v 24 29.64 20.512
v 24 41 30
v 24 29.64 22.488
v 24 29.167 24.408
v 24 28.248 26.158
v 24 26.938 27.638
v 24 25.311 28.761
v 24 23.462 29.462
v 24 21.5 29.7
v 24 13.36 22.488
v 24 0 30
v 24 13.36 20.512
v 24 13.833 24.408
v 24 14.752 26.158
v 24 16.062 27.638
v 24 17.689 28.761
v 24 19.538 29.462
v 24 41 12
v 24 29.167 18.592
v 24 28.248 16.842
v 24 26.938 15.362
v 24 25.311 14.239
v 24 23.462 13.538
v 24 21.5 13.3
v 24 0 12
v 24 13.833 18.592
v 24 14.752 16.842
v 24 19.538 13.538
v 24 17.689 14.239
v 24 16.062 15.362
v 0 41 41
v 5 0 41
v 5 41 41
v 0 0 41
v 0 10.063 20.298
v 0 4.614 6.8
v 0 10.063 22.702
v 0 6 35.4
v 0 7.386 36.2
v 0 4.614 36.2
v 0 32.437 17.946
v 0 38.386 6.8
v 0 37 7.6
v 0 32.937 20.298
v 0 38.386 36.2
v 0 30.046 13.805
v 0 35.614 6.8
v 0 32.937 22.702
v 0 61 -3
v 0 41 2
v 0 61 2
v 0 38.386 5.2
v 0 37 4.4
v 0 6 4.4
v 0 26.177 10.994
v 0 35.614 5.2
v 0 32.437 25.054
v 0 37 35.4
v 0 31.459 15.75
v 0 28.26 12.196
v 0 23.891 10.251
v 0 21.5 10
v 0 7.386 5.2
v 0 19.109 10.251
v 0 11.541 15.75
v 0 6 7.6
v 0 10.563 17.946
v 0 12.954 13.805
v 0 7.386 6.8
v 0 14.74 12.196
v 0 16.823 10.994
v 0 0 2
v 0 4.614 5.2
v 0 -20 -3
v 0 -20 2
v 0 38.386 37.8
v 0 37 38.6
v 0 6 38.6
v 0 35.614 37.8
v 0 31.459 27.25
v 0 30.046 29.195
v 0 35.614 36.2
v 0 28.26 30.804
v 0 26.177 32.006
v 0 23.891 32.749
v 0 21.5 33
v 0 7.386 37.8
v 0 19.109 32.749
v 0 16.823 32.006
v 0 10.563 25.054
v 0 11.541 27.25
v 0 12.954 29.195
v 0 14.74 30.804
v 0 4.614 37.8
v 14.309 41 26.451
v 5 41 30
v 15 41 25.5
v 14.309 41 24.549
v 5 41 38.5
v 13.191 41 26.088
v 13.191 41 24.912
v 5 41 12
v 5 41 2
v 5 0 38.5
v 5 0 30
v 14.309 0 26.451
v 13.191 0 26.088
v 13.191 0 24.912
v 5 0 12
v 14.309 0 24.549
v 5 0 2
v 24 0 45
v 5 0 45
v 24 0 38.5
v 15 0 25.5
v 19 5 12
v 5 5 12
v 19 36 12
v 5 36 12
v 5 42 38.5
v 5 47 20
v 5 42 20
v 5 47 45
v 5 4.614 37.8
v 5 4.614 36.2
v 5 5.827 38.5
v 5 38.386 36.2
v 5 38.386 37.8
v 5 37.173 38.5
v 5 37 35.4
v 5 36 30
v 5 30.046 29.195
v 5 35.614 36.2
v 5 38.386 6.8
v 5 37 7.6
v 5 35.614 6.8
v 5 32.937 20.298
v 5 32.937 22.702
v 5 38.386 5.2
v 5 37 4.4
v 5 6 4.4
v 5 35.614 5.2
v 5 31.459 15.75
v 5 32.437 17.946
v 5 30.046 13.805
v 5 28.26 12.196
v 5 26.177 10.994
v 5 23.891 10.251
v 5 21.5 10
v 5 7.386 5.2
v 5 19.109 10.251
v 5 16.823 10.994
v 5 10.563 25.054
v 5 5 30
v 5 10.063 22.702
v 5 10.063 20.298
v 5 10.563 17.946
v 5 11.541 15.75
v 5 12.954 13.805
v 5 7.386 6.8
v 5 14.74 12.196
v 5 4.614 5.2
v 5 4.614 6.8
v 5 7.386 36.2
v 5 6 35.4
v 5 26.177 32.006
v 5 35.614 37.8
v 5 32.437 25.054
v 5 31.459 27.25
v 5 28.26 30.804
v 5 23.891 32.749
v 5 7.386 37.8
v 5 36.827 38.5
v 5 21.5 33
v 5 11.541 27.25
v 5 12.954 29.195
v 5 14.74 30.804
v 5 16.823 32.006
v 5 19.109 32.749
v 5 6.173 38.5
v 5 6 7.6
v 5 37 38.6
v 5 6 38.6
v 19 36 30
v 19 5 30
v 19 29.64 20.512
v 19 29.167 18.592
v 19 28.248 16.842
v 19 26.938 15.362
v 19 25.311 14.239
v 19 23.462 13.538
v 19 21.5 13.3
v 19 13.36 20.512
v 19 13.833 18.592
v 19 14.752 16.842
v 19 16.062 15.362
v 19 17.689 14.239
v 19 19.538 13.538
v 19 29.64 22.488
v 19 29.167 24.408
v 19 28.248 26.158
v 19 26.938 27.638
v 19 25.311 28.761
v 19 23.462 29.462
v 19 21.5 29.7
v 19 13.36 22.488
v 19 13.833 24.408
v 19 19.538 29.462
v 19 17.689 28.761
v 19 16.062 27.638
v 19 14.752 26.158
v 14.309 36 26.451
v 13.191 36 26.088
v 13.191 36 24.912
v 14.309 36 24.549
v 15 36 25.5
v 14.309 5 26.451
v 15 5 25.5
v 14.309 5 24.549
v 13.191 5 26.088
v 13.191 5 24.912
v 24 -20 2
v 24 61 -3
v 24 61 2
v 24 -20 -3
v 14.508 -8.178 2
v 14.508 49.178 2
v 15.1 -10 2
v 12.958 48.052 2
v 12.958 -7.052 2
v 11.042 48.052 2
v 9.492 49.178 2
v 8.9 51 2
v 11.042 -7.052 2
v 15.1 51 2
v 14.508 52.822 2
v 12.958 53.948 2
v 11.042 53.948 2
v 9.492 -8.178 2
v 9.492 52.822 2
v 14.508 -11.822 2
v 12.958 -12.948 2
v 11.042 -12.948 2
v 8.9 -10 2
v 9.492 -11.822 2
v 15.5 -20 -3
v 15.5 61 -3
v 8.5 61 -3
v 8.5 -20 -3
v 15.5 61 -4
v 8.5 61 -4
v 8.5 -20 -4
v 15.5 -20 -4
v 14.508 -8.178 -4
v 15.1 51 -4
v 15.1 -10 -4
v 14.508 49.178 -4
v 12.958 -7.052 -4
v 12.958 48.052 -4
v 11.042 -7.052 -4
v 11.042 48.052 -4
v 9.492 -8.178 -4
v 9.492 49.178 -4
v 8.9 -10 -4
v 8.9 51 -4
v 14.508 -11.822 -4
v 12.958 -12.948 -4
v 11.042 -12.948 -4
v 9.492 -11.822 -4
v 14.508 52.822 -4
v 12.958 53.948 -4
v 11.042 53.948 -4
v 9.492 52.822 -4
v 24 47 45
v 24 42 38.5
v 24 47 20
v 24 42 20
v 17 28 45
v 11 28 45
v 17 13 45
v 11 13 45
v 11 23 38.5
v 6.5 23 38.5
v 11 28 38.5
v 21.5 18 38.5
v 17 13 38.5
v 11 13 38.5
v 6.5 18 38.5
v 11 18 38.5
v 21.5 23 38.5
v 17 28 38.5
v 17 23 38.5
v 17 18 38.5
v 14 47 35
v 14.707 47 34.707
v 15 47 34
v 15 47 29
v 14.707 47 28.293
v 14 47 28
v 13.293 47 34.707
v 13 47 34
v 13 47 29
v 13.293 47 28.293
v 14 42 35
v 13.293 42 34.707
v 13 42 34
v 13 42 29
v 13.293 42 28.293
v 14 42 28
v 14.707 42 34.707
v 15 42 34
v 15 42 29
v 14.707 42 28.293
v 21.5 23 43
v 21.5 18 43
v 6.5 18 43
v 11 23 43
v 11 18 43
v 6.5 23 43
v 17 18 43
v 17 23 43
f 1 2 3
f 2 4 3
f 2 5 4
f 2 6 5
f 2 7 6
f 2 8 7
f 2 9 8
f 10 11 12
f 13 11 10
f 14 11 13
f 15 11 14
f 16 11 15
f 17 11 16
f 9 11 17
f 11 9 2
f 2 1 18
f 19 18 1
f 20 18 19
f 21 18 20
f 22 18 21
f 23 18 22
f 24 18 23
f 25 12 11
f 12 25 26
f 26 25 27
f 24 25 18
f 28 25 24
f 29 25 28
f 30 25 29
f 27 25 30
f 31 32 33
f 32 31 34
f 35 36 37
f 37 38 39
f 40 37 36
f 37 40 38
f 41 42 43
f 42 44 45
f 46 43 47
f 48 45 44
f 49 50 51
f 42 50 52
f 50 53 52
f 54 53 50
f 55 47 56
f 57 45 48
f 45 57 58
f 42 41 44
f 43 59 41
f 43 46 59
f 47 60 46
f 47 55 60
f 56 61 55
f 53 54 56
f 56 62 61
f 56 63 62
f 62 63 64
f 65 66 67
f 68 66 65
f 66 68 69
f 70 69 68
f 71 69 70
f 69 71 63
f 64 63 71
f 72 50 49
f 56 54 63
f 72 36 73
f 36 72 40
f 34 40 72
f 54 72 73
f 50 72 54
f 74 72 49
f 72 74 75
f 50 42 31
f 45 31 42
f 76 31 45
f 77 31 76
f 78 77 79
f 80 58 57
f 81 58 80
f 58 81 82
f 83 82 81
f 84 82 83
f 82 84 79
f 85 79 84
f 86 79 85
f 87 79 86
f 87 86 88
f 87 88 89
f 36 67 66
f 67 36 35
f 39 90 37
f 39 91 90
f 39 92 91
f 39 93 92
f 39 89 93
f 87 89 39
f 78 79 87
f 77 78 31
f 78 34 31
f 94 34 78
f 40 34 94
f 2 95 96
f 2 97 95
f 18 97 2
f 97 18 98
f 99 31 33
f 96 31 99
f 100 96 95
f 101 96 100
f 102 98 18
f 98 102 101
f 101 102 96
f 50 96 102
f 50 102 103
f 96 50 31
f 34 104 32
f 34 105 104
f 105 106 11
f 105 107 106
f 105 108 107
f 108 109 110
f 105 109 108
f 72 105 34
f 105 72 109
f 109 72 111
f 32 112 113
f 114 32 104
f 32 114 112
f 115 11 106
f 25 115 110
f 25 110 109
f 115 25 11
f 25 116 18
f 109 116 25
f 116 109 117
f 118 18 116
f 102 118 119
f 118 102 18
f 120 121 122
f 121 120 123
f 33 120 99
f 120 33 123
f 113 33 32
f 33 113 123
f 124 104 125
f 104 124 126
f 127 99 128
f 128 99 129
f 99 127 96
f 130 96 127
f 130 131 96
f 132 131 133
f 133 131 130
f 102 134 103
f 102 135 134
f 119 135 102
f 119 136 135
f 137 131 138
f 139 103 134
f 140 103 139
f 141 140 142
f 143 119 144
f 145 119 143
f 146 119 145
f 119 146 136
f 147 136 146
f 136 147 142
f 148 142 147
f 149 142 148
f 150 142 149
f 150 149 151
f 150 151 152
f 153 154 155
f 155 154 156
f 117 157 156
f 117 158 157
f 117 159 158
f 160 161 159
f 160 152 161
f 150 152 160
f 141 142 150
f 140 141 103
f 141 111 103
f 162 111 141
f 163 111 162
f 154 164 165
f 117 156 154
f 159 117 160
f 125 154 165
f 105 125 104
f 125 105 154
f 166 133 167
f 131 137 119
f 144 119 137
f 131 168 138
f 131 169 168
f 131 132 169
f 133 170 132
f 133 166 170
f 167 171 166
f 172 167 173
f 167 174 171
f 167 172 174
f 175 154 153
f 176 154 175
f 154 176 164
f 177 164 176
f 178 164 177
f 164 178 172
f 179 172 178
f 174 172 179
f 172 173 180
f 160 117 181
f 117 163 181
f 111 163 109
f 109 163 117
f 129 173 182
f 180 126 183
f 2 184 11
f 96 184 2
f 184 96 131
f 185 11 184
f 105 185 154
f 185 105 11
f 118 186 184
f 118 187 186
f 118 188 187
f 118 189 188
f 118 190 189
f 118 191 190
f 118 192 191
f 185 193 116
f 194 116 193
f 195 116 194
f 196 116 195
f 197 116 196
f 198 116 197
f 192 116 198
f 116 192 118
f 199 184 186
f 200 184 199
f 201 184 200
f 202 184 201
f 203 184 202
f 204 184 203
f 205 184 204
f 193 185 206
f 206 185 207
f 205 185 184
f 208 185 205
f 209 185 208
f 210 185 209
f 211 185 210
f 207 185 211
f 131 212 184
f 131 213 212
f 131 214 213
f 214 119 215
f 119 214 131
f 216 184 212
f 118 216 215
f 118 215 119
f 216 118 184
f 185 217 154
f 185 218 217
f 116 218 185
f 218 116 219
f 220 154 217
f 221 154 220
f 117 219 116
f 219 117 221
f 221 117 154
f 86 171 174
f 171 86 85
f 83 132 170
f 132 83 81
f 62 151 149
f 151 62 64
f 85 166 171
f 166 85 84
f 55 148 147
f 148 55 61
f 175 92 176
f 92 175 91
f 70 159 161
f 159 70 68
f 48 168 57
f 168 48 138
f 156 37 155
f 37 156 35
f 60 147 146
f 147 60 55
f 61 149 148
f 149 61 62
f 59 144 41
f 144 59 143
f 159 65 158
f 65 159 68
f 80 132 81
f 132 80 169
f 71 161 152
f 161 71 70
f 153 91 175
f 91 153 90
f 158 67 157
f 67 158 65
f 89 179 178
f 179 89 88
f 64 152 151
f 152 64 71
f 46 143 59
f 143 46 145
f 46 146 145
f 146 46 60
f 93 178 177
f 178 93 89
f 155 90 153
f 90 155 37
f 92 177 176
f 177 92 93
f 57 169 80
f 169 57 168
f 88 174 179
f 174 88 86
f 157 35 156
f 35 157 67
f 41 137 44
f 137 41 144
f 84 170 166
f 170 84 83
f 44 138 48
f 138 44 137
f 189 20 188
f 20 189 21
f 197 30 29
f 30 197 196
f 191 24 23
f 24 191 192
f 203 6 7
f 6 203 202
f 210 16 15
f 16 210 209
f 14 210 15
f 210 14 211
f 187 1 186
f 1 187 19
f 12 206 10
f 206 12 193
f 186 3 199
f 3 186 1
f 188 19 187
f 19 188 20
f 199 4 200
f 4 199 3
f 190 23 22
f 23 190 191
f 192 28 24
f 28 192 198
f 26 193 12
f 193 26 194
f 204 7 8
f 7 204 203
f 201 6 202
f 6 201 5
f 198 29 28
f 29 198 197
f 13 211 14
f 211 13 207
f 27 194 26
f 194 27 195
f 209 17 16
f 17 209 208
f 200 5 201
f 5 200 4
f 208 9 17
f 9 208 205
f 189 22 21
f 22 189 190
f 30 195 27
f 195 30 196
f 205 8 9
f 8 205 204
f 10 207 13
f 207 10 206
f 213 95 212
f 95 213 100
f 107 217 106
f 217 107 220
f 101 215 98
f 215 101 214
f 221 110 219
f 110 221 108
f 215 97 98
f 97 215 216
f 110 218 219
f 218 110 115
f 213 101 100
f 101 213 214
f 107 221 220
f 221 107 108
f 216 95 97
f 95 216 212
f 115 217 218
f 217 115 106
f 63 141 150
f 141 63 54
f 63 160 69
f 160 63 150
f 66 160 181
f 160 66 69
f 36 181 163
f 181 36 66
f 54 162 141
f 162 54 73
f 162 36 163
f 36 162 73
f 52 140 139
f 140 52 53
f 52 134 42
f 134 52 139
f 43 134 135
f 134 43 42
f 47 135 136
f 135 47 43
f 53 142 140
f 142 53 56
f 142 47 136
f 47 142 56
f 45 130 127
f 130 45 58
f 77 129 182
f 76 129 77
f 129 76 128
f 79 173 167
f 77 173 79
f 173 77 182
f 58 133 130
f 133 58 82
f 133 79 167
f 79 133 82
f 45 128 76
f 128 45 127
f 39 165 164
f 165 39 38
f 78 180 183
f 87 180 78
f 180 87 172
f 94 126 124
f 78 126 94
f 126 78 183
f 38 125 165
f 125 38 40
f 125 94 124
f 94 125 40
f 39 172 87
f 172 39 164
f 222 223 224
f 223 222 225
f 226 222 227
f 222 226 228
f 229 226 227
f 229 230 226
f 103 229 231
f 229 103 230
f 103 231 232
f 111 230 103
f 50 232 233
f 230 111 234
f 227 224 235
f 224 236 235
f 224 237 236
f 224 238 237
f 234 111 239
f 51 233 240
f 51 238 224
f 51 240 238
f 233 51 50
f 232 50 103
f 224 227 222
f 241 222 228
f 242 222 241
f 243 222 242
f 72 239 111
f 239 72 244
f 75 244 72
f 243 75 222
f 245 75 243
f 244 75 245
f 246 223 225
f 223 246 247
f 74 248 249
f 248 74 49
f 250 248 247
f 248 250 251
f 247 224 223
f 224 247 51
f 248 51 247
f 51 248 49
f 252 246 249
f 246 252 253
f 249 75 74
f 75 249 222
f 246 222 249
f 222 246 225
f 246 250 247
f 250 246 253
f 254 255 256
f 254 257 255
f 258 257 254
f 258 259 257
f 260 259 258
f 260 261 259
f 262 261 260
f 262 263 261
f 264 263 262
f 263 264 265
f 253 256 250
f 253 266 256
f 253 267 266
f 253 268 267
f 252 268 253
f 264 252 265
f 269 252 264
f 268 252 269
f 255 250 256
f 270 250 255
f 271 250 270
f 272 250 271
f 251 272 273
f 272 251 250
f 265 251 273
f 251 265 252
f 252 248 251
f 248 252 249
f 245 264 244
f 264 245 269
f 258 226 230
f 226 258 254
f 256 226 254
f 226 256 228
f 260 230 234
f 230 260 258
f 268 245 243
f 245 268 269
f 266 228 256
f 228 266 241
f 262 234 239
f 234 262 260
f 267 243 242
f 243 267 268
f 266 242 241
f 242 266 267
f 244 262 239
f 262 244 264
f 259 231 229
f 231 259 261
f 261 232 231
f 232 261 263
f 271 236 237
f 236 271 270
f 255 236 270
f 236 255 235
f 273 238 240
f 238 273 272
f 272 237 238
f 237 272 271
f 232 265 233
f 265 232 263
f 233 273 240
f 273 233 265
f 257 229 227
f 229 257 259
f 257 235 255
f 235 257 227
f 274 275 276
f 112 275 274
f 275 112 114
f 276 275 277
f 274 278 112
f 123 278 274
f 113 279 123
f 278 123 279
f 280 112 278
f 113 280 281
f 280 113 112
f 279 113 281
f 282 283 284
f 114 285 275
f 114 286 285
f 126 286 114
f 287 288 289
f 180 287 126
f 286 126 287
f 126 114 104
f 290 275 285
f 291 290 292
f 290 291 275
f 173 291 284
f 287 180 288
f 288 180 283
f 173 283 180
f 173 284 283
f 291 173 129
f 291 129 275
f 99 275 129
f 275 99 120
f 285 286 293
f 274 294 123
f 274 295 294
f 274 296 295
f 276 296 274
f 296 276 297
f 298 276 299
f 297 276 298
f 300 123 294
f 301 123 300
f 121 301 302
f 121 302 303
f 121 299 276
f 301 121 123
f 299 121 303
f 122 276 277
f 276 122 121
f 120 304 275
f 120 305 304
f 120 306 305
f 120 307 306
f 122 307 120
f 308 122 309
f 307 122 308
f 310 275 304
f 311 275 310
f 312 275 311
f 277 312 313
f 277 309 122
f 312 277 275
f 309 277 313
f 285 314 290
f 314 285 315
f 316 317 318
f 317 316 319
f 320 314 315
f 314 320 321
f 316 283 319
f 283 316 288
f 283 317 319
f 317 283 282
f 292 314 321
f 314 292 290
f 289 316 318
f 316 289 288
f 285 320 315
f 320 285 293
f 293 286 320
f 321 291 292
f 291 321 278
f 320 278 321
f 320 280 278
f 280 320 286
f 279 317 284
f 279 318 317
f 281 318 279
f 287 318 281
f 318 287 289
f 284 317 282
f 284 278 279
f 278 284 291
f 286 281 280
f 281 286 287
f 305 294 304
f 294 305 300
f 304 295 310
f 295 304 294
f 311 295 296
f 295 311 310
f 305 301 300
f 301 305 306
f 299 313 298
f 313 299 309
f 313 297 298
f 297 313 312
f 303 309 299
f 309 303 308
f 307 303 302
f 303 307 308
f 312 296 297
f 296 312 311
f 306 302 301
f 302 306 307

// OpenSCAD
union() {
difference() {
	cube([24,41,41]);
	translate([5,-1,-1]) cube([24,45,13]);
	translate([5,-1,30]) cube([24,45,22]);
	translate([5,5,-1]) cube([14,31,120]);

	translate([-1,21.5,21.5]) rotate([0,90,0]) cylinder(r=11.5,h=20);
	translate([10,21.5,21.5]) rotate([0,90,0]) cylinder(r=8.2,h=20);

	translate([14,-1,21.5+4]) rotate([-90,0,0]) cylinder(r=1,h=120);

	translate([-1,21.5-15.5,21.5-15.5]) rotate([0,90,0]) cylinder(r=1.6,h=20);
	translate([-1,21.5+15.5,21.5-15.5]) rotate([0,90,0]) cylinder(r=1.6,h=20);
	translate([-1,21.5+15.5,21.5+15.5]) rotate([0,90,0]) cylinder(r=1.6,h=20);
	translate([-1,21.5-15.5,21.5+15.5]) rotate([0,90,0]) cylinder(r=1.6,h=20);

}
difference() {
union() {
		translate([0,-20,-3]) cube([24,81,5]);
		translate([8.5,-20,-4]) cube([7,81,5]);
	}
	translate([12,-10,-10]) cylinder(r=3.1,h=80);
	translate([12,51,-10]) cylinder(r=3.1,h=80);
	

}
}
vyska=20;

translate([5,0,40]) {
difference() {union(){
	translate([0,0,-1.5]) cube([19,47,6.5]);
	//translate([9-7.5-1,20.5-2.5-1,-2]) cube([17,7,2]);

	translate([0,42,-vyska]) cube([19,5,vyska]);
	}
	

translate([9-7.5,20.5-2.5,-17]) cube([15,5,20]);
translate([9-3,20.5-7.5,-17]) cube([6,15,30]);
translate([9,-1,-1.5-4.5]) rotate([-90,0,0]) cylinder(r=1,h=120, $fn=8);
translate([9,-1,-1.5-4.5-5]) rotate([-90,0,0]) cylinder(r=1,h=120, $fn=8)
;
translate([9-1,41,-1.5-4.5-5]) cube([2,10,5]);
}

}
